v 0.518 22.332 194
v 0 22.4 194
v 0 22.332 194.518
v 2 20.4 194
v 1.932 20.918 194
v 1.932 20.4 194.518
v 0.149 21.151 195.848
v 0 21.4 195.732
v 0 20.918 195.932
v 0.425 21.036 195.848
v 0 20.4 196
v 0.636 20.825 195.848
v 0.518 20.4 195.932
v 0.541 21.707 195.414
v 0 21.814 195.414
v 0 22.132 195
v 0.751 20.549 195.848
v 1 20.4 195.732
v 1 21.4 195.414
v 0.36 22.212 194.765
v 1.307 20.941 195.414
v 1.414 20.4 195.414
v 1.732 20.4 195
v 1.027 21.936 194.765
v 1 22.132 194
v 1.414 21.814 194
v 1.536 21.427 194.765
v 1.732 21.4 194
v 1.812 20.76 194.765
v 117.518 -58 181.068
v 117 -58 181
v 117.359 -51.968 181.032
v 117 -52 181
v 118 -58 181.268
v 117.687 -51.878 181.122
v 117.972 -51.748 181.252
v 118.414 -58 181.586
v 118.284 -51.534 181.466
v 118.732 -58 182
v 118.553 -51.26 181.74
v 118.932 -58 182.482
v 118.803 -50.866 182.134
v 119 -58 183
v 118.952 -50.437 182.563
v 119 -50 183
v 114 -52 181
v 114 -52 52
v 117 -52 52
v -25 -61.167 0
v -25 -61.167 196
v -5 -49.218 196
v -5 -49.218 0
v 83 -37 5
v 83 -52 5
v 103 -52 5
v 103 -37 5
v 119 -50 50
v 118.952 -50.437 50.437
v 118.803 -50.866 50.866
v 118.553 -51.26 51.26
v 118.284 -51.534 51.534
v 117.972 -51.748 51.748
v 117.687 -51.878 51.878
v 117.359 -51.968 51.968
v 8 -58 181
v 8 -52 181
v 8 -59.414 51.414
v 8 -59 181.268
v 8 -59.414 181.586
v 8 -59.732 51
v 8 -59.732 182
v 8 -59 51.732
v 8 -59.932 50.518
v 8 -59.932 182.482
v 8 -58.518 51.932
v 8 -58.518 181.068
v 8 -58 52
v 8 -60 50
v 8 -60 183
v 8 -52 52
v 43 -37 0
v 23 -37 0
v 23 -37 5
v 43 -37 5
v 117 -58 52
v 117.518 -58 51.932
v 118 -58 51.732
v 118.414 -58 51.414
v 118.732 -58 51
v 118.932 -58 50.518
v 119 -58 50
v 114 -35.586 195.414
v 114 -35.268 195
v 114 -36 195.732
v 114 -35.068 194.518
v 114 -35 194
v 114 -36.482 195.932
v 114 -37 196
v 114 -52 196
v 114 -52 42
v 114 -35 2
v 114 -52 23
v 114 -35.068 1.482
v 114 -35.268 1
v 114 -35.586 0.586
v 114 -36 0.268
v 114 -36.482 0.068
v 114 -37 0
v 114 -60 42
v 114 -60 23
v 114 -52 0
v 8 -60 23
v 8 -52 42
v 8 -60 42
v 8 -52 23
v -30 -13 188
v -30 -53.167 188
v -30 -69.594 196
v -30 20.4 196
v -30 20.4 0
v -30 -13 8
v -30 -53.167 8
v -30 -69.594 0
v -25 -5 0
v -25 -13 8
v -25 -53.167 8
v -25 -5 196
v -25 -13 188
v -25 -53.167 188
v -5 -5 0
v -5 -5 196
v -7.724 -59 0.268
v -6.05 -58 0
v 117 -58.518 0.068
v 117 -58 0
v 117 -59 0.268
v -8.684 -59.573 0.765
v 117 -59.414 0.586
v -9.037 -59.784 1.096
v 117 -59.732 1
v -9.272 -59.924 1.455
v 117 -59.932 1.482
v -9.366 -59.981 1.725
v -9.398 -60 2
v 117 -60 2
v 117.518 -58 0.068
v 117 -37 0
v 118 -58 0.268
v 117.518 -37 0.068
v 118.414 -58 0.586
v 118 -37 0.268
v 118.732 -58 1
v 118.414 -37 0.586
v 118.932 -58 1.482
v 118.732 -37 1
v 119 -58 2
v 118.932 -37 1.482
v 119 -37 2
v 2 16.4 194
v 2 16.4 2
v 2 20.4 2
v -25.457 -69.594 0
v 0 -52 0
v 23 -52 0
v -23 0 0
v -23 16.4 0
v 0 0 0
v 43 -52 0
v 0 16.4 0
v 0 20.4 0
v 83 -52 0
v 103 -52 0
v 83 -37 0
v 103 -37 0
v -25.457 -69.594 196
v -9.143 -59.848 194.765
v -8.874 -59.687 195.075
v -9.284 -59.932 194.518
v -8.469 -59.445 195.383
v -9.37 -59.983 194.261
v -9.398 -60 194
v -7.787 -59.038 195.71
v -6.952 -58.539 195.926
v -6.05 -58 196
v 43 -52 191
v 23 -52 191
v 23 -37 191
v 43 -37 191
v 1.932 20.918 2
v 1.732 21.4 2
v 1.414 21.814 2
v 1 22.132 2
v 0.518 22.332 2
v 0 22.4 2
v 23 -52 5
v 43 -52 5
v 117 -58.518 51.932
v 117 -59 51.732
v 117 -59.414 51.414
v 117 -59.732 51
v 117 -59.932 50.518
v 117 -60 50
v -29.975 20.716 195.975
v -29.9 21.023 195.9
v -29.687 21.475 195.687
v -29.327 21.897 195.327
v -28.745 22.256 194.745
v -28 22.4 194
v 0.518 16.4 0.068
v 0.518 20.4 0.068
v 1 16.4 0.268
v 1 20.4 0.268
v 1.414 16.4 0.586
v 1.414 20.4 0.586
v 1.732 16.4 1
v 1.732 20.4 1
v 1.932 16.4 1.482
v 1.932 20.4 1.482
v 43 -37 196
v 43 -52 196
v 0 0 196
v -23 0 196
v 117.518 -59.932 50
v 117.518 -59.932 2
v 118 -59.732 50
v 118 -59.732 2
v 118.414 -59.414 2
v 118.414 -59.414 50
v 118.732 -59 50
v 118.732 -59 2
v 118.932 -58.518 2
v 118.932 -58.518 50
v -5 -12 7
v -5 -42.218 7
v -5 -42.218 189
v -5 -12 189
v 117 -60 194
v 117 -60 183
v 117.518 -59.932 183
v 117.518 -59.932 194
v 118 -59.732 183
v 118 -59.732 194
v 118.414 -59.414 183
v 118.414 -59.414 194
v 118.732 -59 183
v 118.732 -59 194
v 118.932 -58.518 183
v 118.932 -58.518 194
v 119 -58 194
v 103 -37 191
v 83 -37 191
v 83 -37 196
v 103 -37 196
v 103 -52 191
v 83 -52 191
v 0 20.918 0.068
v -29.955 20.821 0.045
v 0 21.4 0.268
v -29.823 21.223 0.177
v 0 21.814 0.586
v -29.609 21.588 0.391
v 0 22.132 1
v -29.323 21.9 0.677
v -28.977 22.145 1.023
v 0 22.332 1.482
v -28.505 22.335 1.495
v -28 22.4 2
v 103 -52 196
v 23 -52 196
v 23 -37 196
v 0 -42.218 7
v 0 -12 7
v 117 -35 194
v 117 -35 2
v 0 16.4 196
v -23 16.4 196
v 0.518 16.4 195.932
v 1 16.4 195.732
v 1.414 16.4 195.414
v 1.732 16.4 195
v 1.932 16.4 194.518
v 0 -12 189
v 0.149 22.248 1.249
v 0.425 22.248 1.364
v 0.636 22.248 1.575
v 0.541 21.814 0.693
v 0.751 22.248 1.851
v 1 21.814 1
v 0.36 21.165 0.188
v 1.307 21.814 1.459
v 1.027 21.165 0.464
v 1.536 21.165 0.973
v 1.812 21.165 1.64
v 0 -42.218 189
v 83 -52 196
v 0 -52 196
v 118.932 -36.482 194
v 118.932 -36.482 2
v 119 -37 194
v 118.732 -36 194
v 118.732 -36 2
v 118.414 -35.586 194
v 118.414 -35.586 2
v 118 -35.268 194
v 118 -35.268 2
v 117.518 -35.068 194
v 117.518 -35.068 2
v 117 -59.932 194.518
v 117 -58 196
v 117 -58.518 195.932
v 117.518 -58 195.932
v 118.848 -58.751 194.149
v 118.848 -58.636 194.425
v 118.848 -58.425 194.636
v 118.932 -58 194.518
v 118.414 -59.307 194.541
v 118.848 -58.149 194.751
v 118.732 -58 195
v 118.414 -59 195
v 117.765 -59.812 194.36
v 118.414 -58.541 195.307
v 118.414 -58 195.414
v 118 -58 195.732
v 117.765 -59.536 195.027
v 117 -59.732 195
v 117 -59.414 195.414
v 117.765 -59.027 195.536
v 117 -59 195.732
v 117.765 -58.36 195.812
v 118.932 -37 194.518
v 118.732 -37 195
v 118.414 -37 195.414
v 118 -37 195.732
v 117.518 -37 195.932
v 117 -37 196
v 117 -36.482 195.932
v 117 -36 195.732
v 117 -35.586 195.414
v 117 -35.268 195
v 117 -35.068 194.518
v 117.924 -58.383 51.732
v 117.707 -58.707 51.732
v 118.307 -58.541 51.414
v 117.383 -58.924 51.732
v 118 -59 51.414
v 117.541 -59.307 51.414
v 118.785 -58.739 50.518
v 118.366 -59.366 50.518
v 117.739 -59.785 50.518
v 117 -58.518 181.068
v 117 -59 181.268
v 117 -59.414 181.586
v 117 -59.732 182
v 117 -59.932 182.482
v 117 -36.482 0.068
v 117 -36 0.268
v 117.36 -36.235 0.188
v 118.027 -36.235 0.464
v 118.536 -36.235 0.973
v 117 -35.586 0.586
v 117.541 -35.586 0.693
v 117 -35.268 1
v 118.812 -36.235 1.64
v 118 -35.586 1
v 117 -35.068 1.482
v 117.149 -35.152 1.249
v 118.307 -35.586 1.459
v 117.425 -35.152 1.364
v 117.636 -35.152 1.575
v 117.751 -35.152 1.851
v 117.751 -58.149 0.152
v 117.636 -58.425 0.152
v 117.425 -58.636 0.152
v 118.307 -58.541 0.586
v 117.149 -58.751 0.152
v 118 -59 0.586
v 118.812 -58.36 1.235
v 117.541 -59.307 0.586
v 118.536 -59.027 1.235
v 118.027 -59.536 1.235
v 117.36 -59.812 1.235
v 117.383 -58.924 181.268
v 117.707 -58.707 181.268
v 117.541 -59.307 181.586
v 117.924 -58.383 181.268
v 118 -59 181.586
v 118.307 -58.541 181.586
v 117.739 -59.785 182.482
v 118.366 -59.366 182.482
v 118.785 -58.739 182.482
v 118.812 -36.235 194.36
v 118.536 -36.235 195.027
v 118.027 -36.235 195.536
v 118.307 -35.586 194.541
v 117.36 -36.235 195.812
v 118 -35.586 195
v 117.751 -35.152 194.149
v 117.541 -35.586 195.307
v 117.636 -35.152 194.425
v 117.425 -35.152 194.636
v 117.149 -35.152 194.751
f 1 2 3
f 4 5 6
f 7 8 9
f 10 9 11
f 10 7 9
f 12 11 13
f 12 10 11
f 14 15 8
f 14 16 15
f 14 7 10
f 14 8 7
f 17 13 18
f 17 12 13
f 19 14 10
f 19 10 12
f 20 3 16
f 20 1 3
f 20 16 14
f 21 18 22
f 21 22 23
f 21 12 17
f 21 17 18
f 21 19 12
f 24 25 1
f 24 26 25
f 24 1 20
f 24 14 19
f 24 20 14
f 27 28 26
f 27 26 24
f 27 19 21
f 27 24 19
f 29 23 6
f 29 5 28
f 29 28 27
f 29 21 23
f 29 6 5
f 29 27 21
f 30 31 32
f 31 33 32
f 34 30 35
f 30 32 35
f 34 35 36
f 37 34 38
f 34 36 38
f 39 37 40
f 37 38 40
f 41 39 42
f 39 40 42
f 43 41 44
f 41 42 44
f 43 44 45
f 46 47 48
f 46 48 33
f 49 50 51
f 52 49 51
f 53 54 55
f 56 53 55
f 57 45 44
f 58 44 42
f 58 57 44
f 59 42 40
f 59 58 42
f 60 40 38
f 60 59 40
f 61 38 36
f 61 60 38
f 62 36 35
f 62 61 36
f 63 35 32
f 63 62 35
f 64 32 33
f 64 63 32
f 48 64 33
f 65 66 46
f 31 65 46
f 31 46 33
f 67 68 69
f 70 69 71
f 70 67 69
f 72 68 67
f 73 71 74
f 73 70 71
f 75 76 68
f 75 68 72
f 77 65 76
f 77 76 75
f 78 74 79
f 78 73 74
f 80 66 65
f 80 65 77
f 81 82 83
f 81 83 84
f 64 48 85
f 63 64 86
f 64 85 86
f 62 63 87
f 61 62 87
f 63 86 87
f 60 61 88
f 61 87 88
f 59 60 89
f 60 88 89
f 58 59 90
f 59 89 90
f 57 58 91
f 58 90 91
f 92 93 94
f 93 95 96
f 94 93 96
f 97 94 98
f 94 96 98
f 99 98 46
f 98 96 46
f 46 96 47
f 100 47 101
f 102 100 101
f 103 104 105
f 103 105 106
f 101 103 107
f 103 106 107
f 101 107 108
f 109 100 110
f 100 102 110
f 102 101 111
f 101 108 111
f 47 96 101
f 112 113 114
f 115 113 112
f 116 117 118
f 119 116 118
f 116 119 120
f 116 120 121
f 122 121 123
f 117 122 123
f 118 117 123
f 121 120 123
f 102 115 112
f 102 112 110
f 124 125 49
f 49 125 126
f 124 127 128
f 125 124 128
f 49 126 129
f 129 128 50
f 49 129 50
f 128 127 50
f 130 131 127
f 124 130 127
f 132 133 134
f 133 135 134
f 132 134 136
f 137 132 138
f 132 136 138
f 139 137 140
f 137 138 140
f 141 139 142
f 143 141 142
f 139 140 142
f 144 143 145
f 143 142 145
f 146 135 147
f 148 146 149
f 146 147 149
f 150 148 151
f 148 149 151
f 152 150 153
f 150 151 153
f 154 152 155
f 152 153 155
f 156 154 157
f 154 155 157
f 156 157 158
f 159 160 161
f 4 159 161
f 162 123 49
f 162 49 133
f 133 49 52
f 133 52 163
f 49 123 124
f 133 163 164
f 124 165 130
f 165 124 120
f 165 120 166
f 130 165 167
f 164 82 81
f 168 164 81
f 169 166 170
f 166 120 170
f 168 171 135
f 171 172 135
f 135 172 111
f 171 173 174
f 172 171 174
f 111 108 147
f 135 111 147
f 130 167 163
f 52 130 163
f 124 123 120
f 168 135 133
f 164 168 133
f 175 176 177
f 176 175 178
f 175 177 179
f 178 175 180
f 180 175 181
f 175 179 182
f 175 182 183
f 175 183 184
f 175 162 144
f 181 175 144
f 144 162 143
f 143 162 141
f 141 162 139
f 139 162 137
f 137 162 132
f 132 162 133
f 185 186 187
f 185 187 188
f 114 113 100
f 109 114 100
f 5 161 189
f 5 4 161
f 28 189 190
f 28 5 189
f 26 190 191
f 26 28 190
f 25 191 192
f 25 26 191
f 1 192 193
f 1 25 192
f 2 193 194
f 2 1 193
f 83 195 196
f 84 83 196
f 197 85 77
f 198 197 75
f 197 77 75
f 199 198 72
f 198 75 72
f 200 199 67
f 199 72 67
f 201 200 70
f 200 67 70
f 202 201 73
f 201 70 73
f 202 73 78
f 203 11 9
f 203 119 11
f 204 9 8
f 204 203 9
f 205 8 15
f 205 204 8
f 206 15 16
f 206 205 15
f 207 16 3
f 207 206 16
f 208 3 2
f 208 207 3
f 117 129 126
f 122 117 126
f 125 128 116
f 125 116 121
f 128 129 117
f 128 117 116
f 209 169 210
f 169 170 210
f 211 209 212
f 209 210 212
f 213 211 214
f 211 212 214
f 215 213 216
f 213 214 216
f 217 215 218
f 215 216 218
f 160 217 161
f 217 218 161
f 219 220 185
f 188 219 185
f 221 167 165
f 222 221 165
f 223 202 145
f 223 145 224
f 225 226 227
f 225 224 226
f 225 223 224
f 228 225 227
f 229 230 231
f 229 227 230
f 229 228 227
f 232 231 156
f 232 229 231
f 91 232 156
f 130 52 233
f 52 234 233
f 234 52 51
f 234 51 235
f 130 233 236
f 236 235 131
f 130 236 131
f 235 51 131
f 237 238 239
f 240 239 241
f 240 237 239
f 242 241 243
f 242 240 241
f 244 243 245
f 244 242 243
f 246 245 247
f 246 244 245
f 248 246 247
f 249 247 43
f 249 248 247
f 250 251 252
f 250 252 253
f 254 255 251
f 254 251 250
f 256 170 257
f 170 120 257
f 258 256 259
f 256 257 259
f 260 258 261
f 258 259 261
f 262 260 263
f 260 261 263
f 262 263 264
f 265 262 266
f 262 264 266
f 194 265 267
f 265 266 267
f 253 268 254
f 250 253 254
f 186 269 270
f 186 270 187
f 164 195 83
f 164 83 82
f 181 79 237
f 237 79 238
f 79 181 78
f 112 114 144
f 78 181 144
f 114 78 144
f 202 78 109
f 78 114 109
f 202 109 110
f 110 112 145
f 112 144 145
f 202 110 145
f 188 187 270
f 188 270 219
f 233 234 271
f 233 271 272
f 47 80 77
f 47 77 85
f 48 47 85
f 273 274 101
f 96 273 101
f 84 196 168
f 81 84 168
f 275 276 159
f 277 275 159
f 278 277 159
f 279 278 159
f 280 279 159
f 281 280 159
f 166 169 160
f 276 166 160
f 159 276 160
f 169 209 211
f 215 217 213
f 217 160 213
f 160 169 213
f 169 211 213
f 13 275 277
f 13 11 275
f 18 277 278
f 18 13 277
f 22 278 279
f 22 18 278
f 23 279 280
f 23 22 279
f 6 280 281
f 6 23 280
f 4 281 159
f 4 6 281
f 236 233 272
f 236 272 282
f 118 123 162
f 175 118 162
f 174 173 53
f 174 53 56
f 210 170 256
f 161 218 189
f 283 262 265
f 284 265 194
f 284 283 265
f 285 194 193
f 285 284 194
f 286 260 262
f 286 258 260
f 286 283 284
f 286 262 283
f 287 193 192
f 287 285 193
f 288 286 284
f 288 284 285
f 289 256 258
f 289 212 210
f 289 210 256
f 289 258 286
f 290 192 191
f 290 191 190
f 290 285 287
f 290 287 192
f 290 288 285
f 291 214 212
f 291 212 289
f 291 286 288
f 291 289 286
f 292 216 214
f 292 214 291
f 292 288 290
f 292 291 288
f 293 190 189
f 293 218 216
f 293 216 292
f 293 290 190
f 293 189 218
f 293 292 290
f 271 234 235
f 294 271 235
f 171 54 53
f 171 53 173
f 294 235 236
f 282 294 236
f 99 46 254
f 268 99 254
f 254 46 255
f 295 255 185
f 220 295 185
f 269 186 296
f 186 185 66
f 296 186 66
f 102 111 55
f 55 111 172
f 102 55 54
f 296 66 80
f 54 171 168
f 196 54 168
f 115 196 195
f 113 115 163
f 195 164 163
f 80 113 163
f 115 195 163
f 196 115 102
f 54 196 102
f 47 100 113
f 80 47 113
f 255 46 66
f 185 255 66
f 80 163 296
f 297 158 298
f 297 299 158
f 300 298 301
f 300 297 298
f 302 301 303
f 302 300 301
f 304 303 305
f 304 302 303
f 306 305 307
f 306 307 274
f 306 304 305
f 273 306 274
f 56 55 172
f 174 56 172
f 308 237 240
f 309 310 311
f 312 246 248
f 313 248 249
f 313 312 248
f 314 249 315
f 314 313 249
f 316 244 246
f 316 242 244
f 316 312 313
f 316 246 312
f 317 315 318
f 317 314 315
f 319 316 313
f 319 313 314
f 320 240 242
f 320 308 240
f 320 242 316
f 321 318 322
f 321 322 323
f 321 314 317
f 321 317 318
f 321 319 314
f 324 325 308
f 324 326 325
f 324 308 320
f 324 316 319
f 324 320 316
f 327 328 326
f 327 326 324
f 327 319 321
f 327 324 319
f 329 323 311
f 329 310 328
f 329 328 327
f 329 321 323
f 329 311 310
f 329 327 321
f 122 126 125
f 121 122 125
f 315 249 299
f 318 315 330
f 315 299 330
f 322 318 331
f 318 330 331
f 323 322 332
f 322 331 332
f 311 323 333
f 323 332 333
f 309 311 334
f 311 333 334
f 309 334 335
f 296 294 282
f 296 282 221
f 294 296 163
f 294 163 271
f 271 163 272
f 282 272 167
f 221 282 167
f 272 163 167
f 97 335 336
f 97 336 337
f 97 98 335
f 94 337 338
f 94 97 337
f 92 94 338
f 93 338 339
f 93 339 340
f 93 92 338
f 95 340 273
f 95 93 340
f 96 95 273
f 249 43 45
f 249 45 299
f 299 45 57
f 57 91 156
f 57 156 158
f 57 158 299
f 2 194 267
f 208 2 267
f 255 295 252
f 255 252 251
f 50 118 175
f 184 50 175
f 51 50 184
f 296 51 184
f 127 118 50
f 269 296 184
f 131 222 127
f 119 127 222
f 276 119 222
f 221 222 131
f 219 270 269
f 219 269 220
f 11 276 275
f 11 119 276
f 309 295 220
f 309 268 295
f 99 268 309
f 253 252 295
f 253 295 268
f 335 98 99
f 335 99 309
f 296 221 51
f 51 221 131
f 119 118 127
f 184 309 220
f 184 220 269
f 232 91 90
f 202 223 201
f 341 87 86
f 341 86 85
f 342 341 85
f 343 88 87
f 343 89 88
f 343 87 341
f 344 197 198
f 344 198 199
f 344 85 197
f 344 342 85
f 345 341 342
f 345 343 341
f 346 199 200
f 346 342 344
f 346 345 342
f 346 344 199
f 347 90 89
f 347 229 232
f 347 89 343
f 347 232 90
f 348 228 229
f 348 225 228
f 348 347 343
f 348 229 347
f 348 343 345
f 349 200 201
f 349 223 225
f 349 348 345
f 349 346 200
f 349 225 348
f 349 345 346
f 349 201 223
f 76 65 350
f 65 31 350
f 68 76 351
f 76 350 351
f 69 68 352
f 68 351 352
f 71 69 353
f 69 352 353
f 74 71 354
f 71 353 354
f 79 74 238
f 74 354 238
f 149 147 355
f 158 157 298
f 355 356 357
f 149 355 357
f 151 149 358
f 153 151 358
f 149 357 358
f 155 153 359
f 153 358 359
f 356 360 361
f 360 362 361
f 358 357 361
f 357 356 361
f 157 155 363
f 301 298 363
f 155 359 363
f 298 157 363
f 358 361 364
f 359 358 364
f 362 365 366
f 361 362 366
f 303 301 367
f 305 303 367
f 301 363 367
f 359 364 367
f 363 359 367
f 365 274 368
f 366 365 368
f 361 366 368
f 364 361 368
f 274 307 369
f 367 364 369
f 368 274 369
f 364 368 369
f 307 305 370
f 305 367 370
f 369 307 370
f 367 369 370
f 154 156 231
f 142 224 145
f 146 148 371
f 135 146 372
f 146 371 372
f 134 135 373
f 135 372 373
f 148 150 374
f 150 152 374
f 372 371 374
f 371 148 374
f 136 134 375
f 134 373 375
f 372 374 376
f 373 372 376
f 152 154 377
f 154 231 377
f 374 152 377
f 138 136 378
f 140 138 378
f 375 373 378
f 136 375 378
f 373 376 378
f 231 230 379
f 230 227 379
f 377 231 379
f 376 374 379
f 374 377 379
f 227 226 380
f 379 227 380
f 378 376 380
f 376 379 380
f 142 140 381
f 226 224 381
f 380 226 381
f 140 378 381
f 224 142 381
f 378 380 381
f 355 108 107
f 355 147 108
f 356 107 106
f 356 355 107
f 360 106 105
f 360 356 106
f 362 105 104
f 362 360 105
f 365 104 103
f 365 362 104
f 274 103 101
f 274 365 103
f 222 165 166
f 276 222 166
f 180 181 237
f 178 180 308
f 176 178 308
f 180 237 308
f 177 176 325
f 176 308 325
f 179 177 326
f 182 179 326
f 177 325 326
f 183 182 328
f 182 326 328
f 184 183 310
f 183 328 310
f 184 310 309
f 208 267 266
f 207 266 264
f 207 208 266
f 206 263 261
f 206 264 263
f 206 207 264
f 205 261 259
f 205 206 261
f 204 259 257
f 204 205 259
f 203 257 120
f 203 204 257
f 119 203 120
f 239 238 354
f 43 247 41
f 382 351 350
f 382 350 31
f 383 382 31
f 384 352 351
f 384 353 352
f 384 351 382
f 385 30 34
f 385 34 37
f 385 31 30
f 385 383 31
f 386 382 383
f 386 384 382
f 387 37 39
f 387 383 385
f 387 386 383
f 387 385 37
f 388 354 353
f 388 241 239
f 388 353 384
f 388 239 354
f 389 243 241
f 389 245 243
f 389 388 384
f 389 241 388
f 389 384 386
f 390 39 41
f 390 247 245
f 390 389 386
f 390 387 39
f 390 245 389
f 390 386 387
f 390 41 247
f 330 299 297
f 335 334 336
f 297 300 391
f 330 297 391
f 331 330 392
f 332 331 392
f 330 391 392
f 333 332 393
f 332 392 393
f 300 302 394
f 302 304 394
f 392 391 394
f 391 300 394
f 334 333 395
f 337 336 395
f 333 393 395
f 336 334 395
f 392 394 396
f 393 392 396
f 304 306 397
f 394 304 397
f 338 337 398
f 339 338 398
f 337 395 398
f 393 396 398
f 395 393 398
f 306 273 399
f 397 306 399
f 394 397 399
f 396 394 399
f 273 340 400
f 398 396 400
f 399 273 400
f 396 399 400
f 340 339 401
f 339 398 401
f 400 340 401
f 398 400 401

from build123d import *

# Parameters (mm, degrees)
EXTRUDE_1_DEPTH        = 196
CUT_EXTRUDE_1_DEPTH    = 240.62524927
SKETCH_4_W             = 106
SKETCH_4_H             = 19
CUT_EXTRUDE_2_DEPTH    = 242.065053461
SKETCH_6_W             = 106
SKETCH_6_H             = 129
CUT_EXTRUDE_3_DEPTH    = 242.065053461
SKETCH_7_W             = 20
SKETCH_7_H             = 5
EXTRUDE_3_DEPTH        = 15
PATTERN_LINEAR_1_COUNT = 2
PATTERN_LINEAR_1_PITCH = 60
CUT_EXTRUDE_6_REACH    = 244.147
SKETCH_10_W            = 182
SKETCH_10_H            = 30.218365382
CUT_EXTRUDE_7_REACH    = 254.973
SKETCH_12_W            = 180
SKETCH_12_H            = 40.166727714
CUT_EXTRUDE_8_REACH    = 254.973
SKETCH_13_W            = 129
SKETCH_13_H            = 8
SKETCH_14_W            = 20
SKETCH_14_H            = 5
EXTRUDE_4_DEPTH        = 15
PATTERN_LINEAR_2_COUNT = 2
PATTERN_LINEAR_2_PITCH = 60
FILLET_1_R             = 2
FILLET_2_R             = 2
FILLET_3_R             = 2
FILLET_4_R             = 2


with BuildPart() as part:
    # 草图1 → 凸台-拉伸1 (new body)
    with BuildSketch(Plane.XY):
        Polygon((0, 0), (-23, 0), (-23, 16.4), (2, 16.4), (2, 22.4), (-30, 22.4), (-30, -69.593534811), (-25.456561805, -69.593534811), (-9.398235911, -60), (119, -60), (119, -35), (114, -35), (114, -52), (0, -52), align=None)
    extrude(amount=EXTRUDE_1_DEPTH)

    # 草图2 → 切除-拉伸1 (cut, through all)
    with BuildSketch(Plane.XY.offset(196)):
        Polygon((-25, -5), (-25, -61.166727714), (-5, -49.218365382), (-5, -5), align=None)
    extrude(amount=-CUT_EXTRUDE_1_DEPTH, mode=Mode.SUBTRACT)

    # 草图4 → 切除-拉伸2 (cut, through all)
    with BuildSketch(Plane(origin=(0, -52, 0), x_dir=(1, 0, 0), z_dir=(0, 1, 0))):
        with Locations((61, -32.5)):
            Rectangle(SKETCH_4_W, SKETCH_4_H)
    extrude(amount=-CUT_EXTRUDE_2_DEPTH, mode=Mode.SUBTRACT)

    # 草图6 → 切除-拉伸3 (cut, through all)
    with BuildSketch(Plane(origin=(0, -52, 0), x_dir=(1, 0, 0), z_dir=(0, 1, 0))):
        with Locations((61, -116.5)):
            Rectangle(SKETCH_6_W, SKETCH_6_H)
    extrude(amount=-CUT_EXTRUDE_3_DEPTH, mode=Mode.SUBTRACT)

    # 草图7 → 凸台-拉伸3 (add)
    with BuildSketch(Plane(origin=(0, -52, 0), x_dir=(1, 0, 0), z_dir=(0, 1, 0))):
        with Locations((33, -193.5)):
            Rectangle(SKETCH_7_W, SKETCH_7_H)
    extrude_3 = extrude(amount=EXTRUDE_3_DEPTH)

    # 阵列(线性)1: 凸台-拉伸3 ×2
    with Locations(*[(i * PATTERN_LINEAR_1_PITCH, 0, 0) for i in range(1, PATTERN_LINEAR_1_COUNT)]):
        add(extrude_3)

    # 草图10 → 切除-拉伸6 (cut, up to next)
    with BuildSketch(Plane.ZY.offset(5), mode=Mode.PRIVATE) as cut_extrude_6_sk1:
        with Locations((98, -27.109182691)):
            Rectangle(SKETCH_10_W, SKETCH_10_H)
    cut_extrude_6_tool1 = extrude(cut_extrude_6_sk1.sketch, amount=-CUT_EXTRUDE_6_REACH, mode=Mode.PRIVATE) & part.part
    add(cut_extrude_6_tool1.solids().sort_by_distance((-5, -27.109183, 98))[0], mode=Mode.SUBTRACT)

    # 草图12 → 切除-拉伸7 (cut, up to next)
    with BuildSketch(Plane(origin=(-25, 0, 0), x_dir=(0, 0, -1), z_dir=(1, 0, 0)), mode=Mode.PRIVATE) as cut_extrude_7_sk1:
        with Locations((-98, -33.083363857)):
            Rectangle(SKETCH_12_W, SKETCH_12_H)
    cut_extrude_7_tool1 = extrude(cut_extrude_7_sk1.sketch, amount=-CUT_EXTRUDE_7_REACH, mode=Mode.PRIVATE) & part.part
    add(cut_extrude_7_tool1.solids().sort_by_distance((-25, -33.083364, 98))[0], mode=Mode.SUBTRACT)

    # 草图13 → 切除-拉伸8 (cut, up to next)
    with BuildSketch(Plane.ZY.offset(-114), mode=Mode.PRIVATE) as cut_extrude_8_sk1:
        with Locations((116.5, -56)):
            Rectangle(SKETCH_13_W, SKETCH_13_H)
    cut_extrude_8_tool1 = extrude(cut_extrude_8_sk1.sketch, amount=-CUT_EXTRUDE_8_REACH, mode=Mode.PRIVATE) & part.part
    add(cut_extrude_8_tool1.solids().sort_by_distance((114, -56, 116.5))[0], mode=Mode.SUBTRACT)

    # 草图14 → 凸台-拉伸4 (add)
    with BuildSketch(Plane(origin=(0, -52, 0), x_dir=(1, 0, 0), z_dir=(0, 1, 0))):
        with Locations((33, -2.5)):
            Rectangle(SKETCH_14_W, SKETCH_14_H)
    extrude_4 = extrude(amount=EXTRUDE_4_DEPTH)

    # 阵列(线性)2: 凸台-拉伸4 ×2
    with Locations(*[(i * PATTERN_LINEAR_2_PITCH, 0, 0) for i in range(1, PATTERN_LINEAR_2_COUNT)]):
        add(extrude_4)

    # 圆角1
    fillet_1_edges = [part.edges().sort_by_distance(p)[0] for p in [
        (2, 19.4, 0),
        (-14, 22.4, 0),
        (2, 22.4, 98),
        (-30, 22.4, 98),
        (-14, 22.4, 196),
        (2, 19.4, 196),
    ]]
    fillet(fillet_1_edges, radius=FILLET_1_R)

    # 圆角2
    fillet_2_edges = [part.edges().sort_by_distance(p)[0] for p in [
        (119, -60, 26),
        (119, -47.5, 0),
        (54.800882044, -60, 0),
        (54.800882044, -60, 196),
        (119, -60, 188.5),
        (119, -47.5, 196),
    ]]
    fillet(fillet_2_edges, radius=FILLET_2_R)

    # 圆角3
    fillet_3_edges = [part.edges().sort_by_distance(p)[0] for p in [
        (119, -52, 116.5),
        (115.5, -35, 196),
        (115.5, -35, 0),
        (119, -35, 98),
        (118.414213562, -35, 0.585786438),
        (118.414213562, -35, 195.414213562),
    ]]
    fillet(fillet_3_edges, radius=FILLET_3_R)

    # 圆角4
    fillet_4_edges = [part.edges().sort_by_distance(p)[0] for p in [
        (62.5, -60, 52),
        (118.414213562, -59.414213562, 52),
        (62.5, -60, 181),
        (118.414213562, -59.414213562, 181),
        (119, -54, 52),
        (119, -54, 181),
    ]]
    fillet(fillet_4_edges, radius=FILLET_4_R - 0.0001)  # a hair under: the kernel refuses the full size


solid = part.part
